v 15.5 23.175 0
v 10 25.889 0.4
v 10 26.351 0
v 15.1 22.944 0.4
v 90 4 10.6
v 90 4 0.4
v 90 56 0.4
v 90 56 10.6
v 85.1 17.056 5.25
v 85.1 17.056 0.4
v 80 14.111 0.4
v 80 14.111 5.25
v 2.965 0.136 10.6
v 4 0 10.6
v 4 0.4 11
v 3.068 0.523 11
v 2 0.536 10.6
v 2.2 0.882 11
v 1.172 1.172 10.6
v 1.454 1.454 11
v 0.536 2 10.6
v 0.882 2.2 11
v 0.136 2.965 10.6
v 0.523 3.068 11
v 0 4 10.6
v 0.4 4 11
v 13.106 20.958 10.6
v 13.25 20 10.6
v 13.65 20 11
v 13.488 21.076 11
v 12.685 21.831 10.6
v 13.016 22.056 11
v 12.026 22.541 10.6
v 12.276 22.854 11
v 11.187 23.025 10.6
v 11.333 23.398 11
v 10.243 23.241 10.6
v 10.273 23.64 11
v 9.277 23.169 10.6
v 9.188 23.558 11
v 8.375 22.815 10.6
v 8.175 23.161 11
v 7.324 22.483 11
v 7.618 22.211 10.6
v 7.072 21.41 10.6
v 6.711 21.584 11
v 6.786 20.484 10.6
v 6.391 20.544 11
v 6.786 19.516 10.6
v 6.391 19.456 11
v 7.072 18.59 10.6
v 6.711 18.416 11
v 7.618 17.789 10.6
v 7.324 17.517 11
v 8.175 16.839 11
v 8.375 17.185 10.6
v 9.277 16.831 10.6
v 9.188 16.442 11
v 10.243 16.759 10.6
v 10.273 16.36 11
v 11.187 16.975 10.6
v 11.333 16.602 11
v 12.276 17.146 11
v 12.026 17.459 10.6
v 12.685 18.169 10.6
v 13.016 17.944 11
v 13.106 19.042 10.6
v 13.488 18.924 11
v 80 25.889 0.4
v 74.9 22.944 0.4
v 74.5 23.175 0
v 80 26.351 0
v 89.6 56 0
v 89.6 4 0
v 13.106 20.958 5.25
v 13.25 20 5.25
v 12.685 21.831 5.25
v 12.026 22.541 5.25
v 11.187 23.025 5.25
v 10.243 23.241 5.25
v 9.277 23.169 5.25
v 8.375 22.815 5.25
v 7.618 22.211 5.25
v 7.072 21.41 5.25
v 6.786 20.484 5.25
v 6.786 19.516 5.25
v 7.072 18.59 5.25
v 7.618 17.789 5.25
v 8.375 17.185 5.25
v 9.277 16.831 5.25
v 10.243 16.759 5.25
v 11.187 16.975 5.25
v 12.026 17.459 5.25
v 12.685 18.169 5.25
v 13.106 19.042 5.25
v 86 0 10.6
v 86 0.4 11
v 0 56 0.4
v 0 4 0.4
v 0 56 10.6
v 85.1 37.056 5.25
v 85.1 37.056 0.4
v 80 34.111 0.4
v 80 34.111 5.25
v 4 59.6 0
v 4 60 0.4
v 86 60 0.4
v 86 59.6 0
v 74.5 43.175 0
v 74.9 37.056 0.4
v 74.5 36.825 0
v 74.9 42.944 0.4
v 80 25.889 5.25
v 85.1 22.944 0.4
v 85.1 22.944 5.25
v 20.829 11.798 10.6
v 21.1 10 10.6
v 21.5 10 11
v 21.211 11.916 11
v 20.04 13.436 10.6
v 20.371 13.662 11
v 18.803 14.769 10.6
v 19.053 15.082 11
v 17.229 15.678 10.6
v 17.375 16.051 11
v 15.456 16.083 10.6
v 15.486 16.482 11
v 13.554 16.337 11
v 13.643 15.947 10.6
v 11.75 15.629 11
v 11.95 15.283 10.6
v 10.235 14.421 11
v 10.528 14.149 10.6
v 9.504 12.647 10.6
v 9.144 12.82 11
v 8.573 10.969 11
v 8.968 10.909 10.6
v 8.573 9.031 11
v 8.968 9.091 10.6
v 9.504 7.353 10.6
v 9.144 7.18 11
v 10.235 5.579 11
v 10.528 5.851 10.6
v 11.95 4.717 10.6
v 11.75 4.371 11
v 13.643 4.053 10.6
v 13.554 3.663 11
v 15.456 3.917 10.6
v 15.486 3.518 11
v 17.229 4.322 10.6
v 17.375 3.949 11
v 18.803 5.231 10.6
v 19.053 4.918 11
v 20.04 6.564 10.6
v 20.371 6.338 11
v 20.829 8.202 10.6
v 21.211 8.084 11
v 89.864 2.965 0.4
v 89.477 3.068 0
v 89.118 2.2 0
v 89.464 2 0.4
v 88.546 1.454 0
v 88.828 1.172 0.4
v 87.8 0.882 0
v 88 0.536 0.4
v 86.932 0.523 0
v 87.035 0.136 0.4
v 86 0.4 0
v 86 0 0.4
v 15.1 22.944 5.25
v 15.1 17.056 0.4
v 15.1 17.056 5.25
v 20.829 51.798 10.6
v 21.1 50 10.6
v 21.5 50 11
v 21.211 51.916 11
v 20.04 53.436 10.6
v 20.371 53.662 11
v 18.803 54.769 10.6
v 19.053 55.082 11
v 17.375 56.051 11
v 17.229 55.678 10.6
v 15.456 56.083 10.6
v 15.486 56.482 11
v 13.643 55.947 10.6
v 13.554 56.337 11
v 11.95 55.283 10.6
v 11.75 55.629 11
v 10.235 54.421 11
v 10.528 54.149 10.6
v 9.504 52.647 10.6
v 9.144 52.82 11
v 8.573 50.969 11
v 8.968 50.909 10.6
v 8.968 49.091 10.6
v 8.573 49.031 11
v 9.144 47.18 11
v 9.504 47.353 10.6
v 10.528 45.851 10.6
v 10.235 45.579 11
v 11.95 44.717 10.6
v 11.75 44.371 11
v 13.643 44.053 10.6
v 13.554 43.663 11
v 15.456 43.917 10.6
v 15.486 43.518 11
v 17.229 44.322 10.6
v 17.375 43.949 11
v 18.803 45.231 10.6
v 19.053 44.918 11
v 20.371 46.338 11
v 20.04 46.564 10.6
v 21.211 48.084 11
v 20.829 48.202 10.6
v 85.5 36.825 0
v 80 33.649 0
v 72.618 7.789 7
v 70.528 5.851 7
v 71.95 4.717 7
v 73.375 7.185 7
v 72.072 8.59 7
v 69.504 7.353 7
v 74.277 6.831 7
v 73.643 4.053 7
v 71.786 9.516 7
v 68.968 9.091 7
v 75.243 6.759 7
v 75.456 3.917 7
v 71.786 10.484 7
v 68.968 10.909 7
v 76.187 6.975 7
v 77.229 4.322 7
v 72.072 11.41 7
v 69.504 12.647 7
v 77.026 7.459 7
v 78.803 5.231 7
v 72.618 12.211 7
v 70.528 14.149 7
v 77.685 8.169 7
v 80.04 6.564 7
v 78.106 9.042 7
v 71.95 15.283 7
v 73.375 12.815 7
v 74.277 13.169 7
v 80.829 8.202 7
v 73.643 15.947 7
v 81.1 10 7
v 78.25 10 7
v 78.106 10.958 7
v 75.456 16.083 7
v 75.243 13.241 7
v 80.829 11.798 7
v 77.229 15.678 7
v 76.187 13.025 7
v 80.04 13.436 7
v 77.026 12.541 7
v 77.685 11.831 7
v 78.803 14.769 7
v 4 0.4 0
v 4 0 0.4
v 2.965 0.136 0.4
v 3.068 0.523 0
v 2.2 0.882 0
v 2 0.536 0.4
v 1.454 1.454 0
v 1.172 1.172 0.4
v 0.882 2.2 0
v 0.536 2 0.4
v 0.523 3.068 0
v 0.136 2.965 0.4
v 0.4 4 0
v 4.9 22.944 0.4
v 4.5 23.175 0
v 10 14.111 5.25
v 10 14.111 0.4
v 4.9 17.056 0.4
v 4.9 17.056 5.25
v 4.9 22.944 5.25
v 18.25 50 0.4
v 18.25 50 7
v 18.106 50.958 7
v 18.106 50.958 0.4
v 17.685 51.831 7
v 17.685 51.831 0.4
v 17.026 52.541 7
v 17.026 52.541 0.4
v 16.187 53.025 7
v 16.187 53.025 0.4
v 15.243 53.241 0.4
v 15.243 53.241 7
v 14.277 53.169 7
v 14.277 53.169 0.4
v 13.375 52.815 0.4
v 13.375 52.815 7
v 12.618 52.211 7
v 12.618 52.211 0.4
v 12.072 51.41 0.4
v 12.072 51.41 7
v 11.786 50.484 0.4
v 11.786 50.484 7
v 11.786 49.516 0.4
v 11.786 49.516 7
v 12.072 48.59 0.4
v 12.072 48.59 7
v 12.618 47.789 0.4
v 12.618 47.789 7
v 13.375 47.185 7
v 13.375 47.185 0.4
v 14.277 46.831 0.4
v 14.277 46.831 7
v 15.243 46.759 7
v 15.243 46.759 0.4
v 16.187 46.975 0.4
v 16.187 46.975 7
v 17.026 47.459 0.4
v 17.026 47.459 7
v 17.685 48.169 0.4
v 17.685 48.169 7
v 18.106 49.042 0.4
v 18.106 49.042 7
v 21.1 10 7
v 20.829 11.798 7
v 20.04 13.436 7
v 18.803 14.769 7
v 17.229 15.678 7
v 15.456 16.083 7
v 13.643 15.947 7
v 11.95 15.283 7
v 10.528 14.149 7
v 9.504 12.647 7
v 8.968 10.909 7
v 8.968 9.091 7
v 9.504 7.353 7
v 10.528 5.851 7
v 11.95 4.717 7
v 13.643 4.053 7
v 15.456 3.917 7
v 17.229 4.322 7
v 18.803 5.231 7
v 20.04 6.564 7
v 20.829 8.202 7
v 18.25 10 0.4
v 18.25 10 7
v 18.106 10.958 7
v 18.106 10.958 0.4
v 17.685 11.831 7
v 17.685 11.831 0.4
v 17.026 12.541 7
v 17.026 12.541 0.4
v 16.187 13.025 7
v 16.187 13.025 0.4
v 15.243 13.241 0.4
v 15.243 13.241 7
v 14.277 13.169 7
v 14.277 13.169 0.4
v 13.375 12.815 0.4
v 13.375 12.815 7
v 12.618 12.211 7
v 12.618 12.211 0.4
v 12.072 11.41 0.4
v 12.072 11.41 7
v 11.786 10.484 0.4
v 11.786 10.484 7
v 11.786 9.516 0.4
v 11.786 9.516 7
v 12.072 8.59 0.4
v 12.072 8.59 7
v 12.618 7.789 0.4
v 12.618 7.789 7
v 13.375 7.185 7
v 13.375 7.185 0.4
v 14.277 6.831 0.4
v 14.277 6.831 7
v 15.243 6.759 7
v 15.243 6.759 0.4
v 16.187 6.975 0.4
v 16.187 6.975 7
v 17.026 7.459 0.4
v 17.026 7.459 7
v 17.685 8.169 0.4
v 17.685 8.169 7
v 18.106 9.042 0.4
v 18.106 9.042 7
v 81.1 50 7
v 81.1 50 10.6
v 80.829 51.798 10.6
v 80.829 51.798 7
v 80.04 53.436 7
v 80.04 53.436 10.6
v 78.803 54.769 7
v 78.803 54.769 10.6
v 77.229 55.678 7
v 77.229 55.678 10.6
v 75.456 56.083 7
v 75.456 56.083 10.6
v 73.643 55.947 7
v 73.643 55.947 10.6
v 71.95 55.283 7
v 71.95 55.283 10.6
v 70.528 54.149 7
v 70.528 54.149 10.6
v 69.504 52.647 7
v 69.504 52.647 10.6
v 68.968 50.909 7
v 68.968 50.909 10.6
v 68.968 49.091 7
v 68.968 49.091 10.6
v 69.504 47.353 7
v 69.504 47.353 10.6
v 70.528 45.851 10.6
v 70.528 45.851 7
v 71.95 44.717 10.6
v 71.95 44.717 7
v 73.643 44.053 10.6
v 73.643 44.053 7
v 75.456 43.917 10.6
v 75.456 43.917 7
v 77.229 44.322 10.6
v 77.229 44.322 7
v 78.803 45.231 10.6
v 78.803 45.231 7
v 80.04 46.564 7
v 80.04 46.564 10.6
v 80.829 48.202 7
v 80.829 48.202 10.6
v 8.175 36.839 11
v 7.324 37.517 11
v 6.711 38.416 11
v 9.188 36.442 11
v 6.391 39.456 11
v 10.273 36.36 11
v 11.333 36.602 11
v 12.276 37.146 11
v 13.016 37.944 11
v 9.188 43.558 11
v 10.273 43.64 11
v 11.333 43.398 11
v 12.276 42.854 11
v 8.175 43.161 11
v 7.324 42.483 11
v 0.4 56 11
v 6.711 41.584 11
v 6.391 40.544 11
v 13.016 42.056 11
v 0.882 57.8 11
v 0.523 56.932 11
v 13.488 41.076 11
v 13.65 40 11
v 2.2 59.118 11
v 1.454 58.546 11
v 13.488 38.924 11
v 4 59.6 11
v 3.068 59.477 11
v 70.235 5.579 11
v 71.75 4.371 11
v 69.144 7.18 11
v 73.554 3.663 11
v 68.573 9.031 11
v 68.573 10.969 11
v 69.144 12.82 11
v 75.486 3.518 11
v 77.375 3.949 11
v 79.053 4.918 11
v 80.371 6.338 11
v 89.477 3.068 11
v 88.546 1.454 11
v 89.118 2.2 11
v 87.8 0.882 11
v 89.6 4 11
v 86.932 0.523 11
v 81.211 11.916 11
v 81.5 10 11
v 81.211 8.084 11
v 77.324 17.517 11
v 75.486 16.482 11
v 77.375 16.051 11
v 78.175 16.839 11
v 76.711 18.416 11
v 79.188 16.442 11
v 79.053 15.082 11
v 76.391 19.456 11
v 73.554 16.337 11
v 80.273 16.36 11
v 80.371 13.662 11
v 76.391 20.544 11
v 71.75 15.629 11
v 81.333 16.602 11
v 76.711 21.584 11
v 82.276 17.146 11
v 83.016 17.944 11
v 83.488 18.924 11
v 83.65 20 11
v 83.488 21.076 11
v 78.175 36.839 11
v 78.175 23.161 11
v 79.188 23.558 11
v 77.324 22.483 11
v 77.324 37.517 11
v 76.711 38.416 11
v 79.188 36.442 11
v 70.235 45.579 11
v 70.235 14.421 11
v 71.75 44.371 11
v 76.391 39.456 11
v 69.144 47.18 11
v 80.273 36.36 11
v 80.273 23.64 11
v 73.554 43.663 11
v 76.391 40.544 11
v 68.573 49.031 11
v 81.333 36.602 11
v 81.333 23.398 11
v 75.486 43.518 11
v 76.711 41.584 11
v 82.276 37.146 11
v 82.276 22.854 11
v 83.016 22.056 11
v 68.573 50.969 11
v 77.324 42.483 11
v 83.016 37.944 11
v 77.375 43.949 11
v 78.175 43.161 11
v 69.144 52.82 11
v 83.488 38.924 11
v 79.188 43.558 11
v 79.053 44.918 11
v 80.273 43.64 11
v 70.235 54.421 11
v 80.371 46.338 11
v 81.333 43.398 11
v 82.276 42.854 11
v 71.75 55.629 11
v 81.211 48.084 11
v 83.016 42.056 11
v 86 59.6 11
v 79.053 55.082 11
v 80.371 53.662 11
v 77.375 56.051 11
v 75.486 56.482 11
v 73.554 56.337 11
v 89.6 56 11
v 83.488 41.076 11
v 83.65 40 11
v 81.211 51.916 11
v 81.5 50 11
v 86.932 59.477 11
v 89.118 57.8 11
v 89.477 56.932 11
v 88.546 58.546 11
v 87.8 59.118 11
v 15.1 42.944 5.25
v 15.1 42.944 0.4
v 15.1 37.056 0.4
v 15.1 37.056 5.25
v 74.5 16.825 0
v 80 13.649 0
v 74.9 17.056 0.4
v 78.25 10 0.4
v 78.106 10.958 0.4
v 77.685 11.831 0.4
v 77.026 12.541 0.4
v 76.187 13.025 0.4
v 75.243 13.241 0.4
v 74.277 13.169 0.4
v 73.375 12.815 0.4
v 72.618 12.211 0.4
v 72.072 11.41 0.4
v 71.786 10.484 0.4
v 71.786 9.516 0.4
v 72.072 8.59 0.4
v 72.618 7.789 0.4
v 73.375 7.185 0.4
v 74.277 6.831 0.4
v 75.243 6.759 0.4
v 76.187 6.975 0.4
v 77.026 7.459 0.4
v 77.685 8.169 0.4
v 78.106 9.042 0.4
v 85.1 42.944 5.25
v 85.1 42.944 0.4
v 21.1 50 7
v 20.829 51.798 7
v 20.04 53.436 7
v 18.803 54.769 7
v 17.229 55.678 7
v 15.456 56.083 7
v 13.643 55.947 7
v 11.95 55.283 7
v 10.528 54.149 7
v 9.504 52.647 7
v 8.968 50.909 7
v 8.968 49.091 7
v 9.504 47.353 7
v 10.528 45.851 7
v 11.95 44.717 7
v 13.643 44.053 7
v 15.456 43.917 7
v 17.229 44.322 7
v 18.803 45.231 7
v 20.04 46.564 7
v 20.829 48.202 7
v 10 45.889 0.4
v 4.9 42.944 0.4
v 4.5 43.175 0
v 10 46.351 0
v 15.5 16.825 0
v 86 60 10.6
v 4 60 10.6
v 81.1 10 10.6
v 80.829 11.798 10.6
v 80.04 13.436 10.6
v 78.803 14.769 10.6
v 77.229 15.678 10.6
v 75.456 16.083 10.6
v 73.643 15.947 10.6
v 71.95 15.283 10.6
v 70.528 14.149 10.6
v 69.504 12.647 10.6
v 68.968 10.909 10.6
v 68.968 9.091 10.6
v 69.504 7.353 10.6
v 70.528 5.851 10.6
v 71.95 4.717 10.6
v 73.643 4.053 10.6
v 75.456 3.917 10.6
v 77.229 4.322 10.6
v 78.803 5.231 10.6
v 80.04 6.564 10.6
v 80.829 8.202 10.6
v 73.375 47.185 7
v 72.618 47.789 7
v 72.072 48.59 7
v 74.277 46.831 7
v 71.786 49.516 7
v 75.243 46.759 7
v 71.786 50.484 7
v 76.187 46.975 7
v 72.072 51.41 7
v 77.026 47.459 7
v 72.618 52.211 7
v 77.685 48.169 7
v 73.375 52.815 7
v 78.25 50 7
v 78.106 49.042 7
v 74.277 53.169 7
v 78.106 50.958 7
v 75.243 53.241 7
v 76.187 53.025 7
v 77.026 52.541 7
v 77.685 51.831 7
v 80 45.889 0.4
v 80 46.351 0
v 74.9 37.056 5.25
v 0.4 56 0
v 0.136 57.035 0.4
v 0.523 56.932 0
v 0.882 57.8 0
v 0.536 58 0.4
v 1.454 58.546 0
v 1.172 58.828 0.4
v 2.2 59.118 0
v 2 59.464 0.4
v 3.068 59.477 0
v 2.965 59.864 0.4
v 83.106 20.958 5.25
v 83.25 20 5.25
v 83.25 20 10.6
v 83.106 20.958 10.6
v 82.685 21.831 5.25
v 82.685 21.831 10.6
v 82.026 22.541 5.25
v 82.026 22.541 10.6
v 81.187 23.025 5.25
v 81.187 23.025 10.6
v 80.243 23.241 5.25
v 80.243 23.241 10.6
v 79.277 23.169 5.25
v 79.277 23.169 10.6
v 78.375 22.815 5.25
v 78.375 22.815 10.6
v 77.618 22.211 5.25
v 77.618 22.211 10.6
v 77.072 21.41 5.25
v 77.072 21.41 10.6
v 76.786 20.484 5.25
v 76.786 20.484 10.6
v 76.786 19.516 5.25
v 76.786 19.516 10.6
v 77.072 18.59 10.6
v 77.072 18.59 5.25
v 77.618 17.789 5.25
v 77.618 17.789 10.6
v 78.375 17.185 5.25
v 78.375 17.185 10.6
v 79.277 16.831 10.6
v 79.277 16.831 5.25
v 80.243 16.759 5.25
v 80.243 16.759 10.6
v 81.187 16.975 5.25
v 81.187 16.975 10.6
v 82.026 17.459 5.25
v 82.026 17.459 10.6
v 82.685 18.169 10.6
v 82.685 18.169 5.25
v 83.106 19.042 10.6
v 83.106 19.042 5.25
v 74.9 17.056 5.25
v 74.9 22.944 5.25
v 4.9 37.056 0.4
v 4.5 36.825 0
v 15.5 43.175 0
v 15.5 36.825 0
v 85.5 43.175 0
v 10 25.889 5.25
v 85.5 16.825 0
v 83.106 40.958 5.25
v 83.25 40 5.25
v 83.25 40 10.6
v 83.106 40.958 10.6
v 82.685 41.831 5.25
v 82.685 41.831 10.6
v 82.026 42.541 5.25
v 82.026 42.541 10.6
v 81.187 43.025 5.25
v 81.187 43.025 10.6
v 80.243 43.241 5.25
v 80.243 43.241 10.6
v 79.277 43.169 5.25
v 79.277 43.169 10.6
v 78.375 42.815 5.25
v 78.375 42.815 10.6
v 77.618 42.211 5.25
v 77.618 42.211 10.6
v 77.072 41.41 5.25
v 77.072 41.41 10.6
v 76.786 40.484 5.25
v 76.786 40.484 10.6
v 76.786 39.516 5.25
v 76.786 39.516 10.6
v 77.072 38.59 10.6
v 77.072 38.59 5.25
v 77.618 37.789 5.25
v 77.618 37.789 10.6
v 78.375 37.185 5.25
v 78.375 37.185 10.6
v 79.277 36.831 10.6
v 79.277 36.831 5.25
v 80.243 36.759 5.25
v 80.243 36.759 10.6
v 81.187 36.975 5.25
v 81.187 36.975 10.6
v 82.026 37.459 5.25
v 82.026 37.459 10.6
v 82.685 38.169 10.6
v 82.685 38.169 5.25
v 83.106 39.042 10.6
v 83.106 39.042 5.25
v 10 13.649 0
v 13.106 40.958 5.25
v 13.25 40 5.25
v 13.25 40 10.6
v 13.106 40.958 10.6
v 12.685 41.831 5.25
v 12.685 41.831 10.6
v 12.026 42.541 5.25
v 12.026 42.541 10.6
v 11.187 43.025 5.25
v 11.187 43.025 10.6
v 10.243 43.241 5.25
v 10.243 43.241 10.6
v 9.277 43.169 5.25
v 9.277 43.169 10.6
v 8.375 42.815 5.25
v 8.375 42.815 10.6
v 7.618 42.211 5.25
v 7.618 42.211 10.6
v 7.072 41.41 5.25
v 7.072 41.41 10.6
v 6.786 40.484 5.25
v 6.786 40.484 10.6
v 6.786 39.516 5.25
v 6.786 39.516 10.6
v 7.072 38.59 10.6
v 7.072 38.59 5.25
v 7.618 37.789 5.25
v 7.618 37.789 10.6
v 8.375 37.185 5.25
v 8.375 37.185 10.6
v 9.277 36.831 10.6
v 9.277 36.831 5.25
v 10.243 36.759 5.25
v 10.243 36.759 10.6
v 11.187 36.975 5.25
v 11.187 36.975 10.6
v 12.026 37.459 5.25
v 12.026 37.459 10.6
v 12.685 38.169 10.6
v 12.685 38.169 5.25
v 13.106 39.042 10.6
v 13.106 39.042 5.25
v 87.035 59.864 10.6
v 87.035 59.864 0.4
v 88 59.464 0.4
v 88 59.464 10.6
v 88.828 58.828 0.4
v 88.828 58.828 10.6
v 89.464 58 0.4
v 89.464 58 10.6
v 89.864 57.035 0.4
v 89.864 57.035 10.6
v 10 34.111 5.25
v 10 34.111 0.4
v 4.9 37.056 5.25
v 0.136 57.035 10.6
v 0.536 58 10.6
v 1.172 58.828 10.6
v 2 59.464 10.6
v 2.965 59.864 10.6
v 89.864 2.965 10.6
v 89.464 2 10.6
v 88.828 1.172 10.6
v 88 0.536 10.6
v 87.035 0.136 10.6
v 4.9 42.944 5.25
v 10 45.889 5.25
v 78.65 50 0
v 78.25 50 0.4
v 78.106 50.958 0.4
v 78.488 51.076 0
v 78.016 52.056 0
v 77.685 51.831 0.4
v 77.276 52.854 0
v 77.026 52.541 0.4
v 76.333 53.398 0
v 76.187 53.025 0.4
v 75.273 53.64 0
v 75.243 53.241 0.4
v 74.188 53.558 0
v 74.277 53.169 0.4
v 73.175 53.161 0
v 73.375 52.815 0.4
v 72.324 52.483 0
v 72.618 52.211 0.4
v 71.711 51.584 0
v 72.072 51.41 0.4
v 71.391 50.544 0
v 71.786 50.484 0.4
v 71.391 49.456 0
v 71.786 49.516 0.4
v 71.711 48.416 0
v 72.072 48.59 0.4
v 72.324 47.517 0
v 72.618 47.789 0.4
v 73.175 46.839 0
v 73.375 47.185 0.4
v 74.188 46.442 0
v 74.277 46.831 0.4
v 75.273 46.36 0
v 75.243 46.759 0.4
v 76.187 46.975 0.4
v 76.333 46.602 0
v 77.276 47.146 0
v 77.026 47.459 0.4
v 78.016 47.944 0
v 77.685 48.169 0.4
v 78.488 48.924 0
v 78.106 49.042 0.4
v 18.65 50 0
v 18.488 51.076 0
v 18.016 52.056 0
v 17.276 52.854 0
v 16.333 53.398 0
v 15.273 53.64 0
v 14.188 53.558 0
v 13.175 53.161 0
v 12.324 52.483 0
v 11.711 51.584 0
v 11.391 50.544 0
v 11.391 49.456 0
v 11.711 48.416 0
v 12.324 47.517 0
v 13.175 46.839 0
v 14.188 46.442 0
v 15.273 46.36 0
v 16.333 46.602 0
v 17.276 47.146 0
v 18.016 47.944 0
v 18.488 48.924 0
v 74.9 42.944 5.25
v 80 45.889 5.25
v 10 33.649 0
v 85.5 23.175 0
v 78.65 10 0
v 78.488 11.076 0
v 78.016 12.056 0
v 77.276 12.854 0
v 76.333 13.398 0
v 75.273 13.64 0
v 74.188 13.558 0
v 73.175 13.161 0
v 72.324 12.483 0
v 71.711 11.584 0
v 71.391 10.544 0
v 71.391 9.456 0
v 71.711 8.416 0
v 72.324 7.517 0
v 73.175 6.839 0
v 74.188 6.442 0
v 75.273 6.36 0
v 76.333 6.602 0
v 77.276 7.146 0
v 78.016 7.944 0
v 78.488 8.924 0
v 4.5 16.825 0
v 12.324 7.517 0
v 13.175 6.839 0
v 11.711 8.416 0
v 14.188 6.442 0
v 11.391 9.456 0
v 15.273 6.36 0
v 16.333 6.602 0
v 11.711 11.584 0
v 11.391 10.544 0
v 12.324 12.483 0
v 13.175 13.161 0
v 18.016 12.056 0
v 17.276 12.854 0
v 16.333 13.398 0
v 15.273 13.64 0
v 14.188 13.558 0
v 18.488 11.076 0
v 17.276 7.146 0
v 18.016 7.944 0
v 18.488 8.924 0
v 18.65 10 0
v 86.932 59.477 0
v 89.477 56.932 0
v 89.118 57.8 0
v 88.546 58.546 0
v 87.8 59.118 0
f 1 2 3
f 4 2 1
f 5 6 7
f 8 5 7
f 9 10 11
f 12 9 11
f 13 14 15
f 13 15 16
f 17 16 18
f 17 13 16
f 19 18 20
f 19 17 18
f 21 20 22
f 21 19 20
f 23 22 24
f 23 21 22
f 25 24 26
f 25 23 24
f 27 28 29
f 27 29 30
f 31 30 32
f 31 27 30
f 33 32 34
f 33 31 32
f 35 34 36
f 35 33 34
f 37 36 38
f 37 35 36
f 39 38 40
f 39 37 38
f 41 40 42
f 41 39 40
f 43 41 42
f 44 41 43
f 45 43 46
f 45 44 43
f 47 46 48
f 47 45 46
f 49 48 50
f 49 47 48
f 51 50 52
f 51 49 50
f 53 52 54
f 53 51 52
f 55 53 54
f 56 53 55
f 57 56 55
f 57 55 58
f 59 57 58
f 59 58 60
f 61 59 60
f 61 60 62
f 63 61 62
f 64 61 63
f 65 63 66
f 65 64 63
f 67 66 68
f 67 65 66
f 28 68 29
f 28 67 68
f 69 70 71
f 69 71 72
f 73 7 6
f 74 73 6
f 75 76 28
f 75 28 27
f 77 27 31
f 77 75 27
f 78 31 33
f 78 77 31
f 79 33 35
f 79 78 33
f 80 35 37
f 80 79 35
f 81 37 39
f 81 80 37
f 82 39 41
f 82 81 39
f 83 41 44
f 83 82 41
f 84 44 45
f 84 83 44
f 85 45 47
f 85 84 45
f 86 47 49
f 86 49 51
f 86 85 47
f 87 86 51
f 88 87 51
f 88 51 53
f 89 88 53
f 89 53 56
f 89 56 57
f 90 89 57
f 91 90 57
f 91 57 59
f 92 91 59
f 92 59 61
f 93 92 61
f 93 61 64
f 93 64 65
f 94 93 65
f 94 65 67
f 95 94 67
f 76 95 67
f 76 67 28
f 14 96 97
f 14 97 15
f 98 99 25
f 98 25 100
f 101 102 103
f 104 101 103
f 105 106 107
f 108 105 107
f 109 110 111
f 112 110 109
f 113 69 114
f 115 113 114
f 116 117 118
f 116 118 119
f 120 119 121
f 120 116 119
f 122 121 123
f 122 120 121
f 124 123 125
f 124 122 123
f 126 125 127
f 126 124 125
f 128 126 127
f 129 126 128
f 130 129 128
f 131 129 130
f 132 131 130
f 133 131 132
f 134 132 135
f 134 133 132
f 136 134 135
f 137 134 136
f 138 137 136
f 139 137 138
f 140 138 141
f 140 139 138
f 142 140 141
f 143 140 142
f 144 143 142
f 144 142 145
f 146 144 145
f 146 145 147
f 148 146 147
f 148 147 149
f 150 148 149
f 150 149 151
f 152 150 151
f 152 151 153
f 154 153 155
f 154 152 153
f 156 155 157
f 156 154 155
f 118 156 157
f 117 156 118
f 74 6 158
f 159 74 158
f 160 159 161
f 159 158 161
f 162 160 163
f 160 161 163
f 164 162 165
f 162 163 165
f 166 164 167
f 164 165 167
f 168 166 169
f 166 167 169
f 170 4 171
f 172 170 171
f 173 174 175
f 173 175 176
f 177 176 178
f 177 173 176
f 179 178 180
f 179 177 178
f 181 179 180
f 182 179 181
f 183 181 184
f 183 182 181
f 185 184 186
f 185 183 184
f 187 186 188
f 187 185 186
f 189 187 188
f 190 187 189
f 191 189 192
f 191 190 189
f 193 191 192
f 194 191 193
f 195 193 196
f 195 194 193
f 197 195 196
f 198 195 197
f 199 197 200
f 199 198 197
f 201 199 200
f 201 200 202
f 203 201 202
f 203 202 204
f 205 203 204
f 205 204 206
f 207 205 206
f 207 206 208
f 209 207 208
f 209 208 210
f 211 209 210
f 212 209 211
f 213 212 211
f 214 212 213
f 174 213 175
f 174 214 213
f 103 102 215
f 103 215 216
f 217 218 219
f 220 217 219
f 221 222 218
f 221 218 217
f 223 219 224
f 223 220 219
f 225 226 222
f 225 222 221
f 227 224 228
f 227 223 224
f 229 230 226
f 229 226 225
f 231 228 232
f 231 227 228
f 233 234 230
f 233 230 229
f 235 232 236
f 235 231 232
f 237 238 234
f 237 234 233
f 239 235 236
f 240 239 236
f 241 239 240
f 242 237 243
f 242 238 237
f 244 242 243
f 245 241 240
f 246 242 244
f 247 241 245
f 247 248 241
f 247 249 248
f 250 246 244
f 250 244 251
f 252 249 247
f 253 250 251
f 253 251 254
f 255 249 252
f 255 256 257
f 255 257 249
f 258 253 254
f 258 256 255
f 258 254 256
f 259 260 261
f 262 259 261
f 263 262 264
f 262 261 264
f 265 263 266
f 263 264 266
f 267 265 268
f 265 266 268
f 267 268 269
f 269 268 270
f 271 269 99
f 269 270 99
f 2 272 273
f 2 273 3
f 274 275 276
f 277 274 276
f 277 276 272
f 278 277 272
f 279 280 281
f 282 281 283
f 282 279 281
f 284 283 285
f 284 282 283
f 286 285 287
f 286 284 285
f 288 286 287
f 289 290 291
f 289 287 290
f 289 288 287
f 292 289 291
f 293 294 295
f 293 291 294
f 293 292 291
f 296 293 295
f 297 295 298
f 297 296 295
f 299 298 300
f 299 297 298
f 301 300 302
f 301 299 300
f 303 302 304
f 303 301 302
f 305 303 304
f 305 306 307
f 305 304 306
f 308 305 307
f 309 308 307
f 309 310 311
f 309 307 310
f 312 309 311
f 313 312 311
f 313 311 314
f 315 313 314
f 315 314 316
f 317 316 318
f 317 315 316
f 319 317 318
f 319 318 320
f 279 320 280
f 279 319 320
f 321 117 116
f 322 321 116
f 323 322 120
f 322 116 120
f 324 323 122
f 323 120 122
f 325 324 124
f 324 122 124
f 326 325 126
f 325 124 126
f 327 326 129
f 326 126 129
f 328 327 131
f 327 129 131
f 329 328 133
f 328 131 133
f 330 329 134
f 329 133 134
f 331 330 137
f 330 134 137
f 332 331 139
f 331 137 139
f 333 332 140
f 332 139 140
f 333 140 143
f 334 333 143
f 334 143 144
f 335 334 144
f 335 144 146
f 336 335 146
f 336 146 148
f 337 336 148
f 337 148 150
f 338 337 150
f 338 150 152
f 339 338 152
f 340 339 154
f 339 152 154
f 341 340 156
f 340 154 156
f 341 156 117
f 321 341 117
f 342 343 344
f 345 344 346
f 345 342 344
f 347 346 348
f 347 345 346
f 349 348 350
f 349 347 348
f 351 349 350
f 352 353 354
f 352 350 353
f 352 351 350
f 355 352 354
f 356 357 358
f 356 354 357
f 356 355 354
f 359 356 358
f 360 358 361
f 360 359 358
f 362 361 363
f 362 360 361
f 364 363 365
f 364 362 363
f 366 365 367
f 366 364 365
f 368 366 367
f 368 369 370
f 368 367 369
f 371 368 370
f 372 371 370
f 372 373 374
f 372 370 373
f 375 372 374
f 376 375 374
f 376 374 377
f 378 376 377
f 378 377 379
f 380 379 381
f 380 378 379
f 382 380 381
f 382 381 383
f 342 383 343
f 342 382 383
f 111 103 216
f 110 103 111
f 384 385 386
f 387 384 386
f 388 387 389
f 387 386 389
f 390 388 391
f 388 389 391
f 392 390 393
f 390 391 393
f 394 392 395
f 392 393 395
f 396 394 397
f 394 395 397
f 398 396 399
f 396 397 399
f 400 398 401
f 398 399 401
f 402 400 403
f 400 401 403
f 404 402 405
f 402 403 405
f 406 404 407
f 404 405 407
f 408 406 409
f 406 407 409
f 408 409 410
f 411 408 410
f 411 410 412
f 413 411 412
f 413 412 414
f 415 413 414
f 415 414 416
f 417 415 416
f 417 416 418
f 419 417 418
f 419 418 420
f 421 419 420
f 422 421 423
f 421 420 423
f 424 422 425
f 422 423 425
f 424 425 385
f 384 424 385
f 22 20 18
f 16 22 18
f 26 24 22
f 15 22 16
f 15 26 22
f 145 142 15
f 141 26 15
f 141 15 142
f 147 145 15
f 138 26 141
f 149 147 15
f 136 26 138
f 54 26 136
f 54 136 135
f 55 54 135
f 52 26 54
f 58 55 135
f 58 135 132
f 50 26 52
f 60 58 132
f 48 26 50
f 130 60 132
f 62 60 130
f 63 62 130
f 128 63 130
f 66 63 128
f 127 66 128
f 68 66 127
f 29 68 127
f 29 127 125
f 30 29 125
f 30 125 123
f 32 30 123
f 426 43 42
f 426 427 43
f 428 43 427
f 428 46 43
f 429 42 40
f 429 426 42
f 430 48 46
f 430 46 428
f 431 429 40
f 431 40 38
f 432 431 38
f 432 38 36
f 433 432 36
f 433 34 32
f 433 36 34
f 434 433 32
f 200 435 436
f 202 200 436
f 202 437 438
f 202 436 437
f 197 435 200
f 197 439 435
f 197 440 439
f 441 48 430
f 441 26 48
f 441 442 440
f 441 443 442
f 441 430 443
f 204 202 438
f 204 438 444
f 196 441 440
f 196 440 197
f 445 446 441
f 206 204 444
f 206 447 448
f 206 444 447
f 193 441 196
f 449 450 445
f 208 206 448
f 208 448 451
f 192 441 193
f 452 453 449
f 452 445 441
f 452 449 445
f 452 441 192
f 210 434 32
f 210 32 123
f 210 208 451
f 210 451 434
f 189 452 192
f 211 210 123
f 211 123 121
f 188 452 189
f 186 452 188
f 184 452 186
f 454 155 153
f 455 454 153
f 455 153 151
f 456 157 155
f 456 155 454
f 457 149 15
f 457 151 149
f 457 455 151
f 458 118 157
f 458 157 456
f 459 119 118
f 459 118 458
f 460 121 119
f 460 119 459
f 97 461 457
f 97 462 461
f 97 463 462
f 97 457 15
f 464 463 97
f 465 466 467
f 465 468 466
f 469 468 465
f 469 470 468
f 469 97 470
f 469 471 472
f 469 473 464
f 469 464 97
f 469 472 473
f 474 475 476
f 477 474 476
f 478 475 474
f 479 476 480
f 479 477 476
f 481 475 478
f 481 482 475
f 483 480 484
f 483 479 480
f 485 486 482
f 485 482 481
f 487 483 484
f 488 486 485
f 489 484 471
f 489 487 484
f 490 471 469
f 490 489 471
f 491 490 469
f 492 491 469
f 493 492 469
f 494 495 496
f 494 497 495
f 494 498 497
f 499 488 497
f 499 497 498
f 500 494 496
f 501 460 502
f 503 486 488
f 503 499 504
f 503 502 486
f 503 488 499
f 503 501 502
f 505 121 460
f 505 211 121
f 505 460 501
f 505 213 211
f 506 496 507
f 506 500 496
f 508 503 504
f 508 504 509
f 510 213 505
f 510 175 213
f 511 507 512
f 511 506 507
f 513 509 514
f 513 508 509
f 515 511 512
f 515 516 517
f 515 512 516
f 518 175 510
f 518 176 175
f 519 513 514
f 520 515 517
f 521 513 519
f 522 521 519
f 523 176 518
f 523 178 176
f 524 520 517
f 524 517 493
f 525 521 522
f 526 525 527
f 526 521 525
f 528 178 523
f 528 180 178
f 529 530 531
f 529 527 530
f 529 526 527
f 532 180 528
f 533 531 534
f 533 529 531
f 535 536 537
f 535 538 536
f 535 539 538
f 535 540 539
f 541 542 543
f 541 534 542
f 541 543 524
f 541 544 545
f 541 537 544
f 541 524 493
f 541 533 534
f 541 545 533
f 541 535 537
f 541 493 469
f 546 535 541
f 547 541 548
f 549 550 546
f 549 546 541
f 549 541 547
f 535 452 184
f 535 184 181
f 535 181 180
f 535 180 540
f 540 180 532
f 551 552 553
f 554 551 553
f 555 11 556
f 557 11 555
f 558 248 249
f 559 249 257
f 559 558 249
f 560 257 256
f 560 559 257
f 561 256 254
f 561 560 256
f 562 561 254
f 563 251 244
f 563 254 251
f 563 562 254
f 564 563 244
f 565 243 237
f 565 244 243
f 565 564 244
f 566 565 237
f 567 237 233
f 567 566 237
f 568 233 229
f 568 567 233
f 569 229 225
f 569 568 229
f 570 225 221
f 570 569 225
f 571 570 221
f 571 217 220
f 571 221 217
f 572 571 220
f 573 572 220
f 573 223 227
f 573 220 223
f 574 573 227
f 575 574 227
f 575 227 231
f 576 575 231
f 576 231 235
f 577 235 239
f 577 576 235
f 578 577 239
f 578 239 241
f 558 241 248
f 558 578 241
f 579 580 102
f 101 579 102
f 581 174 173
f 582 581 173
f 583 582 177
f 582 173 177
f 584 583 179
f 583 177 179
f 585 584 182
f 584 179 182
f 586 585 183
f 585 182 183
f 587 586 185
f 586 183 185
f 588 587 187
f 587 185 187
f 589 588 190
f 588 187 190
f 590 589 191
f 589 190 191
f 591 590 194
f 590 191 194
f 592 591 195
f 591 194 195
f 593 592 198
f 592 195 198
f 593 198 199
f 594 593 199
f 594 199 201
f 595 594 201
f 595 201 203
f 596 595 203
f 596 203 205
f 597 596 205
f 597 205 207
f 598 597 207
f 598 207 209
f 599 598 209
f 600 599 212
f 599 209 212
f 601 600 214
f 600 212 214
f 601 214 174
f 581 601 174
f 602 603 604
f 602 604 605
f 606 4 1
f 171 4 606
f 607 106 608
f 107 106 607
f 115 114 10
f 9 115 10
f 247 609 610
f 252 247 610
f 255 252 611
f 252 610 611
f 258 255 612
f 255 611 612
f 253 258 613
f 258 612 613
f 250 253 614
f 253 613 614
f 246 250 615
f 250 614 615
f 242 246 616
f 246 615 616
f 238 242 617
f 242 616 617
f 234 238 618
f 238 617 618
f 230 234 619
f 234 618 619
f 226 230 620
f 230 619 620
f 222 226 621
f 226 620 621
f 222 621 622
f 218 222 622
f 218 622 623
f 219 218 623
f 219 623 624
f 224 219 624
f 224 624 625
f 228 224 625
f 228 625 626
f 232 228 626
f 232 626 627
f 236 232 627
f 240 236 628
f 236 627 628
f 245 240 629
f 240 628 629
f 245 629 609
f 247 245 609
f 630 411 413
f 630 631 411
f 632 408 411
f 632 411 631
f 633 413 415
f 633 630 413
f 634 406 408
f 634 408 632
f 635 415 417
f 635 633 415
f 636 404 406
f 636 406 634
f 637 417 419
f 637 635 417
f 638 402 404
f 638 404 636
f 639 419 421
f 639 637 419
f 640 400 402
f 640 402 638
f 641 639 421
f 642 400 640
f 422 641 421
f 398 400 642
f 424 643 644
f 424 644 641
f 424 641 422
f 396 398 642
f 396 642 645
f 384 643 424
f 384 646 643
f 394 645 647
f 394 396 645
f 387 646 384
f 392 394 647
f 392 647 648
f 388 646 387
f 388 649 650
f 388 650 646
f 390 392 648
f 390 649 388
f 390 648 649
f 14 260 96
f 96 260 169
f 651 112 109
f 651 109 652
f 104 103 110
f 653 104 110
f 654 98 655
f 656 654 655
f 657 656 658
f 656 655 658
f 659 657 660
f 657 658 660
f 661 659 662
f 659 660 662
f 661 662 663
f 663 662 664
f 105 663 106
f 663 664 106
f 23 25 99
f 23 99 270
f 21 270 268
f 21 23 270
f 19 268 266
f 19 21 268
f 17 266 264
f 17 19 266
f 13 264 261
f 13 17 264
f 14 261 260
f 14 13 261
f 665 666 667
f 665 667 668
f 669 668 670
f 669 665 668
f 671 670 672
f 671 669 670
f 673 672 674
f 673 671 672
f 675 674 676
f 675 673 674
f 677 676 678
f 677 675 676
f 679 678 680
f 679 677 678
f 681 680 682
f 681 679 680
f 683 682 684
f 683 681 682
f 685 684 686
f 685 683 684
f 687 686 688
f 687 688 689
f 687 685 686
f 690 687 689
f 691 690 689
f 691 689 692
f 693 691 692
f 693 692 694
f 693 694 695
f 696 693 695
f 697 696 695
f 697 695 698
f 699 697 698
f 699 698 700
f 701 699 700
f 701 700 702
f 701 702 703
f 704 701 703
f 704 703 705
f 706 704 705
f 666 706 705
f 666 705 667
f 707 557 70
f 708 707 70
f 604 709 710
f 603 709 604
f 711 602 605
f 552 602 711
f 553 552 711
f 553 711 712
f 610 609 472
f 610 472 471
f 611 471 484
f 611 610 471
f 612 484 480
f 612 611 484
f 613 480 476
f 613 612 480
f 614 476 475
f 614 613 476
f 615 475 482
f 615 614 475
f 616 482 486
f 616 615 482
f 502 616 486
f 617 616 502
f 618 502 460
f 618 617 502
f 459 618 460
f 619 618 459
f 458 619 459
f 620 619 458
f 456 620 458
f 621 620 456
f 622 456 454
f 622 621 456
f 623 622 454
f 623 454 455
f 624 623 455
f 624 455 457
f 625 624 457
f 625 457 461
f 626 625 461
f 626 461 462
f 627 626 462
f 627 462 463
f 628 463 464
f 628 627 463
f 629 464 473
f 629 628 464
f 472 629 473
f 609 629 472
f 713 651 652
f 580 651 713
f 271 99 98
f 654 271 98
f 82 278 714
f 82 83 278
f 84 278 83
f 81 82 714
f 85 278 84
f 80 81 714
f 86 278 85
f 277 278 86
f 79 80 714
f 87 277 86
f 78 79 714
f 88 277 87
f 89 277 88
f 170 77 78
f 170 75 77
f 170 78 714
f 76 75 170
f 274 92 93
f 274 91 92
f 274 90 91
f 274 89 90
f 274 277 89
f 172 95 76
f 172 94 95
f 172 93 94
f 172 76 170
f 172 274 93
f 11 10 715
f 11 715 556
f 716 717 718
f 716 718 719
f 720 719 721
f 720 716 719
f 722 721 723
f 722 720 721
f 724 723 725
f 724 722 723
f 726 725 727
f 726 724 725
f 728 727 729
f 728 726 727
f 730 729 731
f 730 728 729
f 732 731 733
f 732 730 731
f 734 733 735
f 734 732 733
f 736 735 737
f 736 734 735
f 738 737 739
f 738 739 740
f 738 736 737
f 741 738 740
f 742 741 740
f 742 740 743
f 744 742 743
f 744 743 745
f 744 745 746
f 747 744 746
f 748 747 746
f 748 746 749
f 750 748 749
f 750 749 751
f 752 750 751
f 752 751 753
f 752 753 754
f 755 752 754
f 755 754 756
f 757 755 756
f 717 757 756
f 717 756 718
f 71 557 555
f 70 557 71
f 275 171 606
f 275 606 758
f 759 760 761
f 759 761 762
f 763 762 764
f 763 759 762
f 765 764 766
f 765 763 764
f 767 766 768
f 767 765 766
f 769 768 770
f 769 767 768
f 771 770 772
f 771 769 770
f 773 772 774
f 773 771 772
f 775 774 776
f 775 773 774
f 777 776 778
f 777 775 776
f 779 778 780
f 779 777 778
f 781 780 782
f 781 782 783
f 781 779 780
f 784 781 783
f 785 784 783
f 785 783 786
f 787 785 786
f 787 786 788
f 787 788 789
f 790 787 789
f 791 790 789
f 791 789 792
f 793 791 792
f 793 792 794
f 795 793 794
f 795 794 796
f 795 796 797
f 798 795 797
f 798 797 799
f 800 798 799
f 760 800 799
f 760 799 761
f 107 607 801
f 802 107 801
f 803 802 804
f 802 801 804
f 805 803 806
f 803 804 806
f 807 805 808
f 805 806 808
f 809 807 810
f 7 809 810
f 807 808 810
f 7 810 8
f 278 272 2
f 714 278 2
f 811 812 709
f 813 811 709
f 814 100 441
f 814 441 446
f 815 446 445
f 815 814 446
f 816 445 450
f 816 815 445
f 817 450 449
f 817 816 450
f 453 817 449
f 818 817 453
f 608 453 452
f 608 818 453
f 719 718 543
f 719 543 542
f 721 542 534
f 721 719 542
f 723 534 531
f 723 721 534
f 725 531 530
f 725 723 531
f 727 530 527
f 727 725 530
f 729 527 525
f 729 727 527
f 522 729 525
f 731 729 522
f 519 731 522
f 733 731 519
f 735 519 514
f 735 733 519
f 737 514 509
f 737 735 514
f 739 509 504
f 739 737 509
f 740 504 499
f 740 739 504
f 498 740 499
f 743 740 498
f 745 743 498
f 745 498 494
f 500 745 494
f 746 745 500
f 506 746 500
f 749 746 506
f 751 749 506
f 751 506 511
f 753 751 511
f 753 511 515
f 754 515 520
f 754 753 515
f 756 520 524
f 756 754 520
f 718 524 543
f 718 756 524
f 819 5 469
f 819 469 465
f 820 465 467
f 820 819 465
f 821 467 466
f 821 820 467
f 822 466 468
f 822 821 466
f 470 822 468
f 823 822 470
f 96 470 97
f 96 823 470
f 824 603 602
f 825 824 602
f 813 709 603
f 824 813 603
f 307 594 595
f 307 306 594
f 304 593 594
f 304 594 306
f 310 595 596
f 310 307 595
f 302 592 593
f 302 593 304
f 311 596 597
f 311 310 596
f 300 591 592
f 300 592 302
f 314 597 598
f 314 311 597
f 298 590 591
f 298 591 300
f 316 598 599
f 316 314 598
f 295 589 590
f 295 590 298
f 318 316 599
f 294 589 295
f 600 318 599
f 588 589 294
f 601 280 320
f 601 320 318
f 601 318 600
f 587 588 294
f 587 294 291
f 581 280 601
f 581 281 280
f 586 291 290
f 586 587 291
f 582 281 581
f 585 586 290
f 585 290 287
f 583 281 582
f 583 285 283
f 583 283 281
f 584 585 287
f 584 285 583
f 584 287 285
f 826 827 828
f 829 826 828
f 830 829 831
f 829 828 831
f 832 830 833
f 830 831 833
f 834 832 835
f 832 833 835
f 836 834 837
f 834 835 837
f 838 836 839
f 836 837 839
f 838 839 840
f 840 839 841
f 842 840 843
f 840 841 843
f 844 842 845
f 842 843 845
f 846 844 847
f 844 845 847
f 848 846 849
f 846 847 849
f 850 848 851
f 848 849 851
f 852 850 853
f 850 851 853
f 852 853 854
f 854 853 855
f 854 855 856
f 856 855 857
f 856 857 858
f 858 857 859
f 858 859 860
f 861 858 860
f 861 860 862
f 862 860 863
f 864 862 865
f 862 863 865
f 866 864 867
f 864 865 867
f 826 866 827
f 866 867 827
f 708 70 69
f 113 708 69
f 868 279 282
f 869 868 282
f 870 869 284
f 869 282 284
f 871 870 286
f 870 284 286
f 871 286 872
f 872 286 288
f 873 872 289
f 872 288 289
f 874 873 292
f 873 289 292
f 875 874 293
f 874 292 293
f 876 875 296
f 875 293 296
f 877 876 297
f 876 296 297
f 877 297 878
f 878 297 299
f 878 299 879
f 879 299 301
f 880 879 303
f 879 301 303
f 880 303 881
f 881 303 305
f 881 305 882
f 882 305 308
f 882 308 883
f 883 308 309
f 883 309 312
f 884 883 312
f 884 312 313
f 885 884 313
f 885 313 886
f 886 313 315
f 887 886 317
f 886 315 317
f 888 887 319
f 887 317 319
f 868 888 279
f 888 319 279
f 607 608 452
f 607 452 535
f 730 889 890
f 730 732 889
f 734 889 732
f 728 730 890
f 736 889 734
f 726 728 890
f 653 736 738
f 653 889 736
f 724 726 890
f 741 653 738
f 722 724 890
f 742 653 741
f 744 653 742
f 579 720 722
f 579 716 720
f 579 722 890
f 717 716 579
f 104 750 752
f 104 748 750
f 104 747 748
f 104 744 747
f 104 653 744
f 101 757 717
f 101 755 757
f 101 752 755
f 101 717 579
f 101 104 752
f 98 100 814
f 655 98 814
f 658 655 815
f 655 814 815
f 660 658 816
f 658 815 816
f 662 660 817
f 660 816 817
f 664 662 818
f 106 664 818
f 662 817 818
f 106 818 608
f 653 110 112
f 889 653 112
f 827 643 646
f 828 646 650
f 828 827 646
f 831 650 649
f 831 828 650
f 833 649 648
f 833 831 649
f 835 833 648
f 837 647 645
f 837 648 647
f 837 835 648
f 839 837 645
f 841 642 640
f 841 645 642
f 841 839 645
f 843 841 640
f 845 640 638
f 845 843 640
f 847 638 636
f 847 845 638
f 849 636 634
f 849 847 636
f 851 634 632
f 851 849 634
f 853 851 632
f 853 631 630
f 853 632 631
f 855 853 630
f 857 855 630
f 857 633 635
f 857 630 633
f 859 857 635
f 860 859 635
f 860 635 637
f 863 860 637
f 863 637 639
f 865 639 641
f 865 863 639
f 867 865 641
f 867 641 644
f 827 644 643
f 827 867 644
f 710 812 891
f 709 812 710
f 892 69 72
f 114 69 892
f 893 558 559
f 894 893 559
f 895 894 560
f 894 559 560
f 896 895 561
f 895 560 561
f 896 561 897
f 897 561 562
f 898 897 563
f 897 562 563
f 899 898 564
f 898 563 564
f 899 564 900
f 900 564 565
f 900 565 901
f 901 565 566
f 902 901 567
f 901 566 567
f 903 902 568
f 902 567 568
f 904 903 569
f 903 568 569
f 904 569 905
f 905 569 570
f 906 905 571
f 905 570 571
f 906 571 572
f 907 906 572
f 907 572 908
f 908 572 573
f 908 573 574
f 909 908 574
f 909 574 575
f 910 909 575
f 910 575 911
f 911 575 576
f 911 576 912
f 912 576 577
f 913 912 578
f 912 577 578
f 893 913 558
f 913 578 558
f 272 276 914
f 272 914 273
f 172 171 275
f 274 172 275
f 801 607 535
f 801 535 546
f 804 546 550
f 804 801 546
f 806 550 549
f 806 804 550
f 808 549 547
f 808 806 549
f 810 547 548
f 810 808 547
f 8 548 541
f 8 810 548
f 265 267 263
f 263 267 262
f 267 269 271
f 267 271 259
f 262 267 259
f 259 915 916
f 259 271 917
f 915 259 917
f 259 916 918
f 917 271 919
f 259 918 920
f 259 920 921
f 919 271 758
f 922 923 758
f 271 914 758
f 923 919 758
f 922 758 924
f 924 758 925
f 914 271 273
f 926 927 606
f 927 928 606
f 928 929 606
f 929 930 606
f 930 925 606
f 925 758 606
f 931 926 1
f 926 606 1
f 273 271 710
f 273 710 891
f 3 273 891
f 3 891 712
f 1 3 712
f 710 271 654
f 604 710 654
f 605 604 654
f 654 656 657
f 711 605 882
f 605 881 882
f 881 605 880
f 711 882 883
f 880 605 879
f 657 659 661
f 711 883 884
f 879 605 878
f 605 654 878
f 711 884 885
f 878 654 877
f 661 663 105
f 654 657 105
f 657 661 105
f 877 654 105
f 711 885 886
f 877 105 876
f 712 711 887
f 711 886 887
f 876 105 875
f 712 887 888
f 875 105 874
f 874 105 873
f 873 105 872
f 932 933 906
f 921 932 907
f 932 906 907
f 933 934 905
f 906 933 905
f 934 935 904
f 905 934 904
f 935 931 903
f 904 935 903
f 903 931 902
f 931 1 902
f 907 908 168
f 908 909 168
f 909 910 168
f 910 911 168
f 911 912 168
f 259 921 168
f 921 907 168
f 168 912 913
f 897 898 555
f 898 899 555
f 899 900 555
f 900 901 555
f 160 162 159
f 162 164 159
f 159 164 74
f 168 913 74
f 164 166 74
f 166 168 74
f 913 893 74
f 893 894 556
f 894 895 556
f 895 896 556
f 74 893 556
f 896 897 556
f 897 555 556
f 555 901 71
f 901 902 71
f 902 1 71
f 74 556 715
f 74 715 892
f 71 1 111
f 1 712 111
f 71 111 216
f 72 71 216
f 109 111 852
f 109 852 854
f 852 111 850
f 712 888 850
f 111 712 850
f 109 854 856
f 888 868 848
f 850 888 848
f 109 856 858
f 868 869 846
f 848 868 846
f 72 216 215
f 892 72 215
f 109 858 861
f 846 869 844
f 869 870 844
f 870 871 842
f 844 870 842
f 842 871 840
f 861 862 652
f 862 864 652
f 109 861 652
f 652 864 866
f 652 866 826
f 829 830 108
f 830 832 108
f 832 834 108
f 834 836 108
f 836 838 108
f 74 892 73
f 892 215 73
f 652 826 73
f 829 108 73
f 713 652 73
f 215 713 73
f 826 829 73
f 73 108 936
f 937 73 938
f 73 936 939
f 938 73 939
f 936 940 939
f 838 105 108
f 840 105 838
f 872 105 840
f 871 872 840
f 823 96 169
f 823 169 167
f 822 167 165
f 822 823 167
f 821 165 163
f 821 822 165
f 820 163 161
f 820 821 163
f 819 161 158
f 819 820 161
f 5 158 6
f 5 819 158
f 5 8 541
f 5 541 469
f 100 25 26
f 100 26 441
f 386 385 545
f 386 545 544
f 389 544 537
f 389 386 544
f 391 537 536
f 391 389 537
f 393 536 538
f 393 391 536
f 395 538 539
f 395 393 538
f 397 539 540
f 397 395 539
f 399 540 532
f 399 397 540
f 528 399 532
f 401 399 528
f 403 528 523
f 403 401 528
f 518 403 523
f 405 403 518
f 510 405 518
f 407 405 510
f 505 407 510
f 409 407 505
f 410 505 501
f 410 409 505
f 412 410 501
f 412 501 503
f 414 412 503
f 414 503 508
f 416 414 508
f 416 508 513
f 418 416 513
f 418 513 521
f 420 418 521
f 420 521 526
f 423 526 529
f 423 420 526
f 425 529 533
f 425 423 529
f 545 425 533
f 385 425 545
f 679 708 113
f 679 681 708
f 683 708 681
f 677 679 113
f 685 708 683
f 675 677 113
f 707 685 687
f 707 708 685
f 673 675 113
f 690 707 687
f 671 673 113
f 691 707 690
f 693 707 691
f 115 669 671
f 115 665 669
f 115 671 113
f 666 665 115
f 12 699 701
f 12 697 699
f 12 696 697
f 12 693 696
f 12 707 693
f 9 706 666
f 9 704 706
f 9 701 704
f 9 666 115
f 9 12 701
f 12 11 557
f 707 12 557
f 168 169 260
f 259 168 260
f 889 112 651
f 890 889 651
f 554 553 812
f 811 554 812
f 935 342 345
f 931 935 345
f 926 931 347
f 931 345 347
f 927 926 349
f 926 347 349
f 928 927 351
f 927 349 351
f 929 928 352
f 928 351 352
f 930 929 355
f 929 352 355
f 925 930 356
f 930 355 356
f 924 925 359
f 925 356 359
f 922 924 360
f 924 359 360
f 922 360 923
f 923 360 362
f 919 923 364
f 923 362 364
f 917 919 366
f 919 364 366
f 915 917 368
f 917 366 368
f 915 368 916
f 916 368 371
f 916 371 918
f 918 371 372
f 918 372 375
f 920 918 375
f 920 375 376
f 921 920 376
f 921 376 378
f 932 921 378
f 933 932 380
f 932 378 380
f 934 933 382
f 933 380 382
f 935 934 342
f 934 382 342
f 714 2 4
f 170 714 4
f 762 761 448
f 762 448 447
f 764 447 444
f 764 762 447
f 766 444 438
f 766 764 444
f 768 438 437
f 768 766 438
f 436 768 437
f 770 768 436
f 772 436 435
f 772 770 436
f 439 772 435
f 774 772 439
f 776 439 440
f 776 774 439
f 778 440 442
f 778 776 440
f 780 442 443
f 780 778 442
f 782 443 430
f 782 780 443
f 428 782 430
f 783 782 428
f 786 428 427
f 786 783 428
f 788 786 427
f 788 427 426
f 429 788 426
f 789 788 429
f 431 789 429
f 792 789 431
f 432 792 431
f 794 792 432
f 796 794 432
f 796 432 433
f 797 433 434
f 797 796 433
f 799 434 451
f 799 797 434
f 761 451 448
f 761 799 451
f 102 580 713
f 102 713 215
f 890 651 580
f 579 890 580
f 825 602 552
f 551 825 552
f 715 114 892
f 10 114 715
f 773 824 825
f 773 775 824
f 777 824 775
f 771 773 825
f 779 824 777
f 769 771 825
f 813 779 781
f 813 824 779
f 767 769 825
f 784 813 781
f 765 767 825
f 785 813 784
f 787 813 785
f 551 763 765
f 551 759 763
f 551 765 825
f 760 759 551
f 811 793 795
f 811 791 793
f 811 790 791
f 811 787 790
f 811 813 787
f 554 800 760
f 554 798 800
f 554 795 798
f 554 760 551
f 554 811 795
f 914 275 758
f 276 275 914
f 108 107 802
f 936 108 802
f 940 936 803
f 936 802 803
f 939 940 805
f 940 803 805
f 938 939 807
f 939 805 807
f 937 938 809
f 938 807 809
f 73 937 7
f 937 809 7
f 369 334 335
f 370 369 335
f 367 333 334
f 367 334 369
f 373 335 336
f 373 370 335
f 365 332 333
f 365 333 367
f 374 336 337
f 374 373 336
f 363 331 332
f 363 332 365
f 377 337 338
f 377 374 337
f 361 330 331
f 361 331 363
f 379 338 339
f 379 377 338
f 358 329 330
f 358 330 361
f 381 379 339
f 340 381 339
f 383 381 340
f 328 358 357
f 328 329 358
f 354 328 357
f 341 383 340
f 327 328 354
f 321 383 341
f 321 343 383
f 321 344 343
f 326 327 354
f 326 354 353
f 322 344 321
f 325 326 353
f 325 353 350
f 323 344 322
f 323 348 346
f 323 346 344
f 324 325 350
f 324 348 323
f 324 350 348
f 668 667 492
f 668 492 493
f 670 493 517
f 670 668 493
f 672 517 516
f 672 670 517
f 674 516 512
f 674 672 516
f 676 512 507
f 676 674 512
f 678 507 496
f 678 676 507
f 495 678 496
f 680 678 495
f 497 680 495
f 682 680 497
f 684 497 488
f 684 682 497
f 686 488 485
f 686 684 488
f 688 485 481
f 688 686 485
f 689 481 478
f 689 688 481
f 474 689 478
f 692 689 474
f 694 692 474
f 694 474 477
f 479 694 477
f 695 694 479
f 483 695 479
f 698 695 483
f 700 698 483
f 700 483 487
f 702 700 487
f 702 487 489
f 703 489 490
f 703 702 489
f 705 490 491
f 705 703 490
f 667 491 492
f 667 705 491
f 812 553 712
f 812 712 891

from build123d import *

# Parameters (mm, degrees)
SKETCH_W        = 90
SKETCH_H        = 60
SKETCH_R        = 3.25
PAD_DEPTH       = 11
SKETCH001_R     = 6.1
POCKET_DEPTH    = 4
POCKET001_DEPTH = 5.25
FILLET_R        = 4
CHAMFER_SIZE    = 0.4
CHAMFER001_SIZE = 0.4


with BuildPart() as part:
    # Sketch → Pad (new body)
    with BuildSketch(Plane.XY):
        with Locations((45, 30)):
            Rectangle(SKETCH_W, SKETCH_H)
        with Locations((10, 40)):
            Circle(SKETCH_R, mode=Mode.SUBTRACT)
        with Locations((80, 40)):
            Circle(SKETCH_R, mode=Mode.SUBTRACT)
        with Locations((10, 20)):
            Circle(SKETCH_R, mode=Mode.SUBTRACT)
        with Locations((80, 20)):
            Circle(SKETCH_R, mode=Mode.SUBTRACT)
        with Locations((15, 50)):
            Circle(SKETCH_R, mode=Mode.SUBTRACT)
        with Locations((75, 50)):
            Circle(SKETCH_R, mode=Mode.SUBTRACT)
        with Locations((75, 10)):
            Circle(SKETCH_R, mode=Mode.SUBTRACT)
        with Locations((15, 10)):
            Circle(SKETCH_R, mode=Mode.SUBTRACT)
    extrude(amount=PAD_DEPTH)

    # Sketch001 (on Face14 of Pad) → Pocket (cut)
    with BuildSketch(Plane.XY.offset(11)):
        with Locations((15, 50)):
            Circle(SKETCH001_R)
        with Locations((75, 50)):
            Circle(SKETCH001_R)
        with Locations((75, 10)):
            Circle(SKETCH001_R)
        with Locations((15, 10)):
            Circle(SKETCH001_R)
    extrude(amount=-POCKET_DEPTH, mode=Mode.SUBTRACT)

    # Sketch002 (on Face4 of Pocket) → Pocket001 (cut)
    with BuildSketch(Plane(origin=(0, 0, 0), x_dir=(1, 0, 0), z_dir=(0, 0, -1))):
        Polygon((15.1, -17.055514), (10, -14.111027), (4.9, -17.055514), (4.9, -22.944486), (10, -25.888973), (15.1, -22.944486), align=None)
        Polygon((80, -14.111027), (74.9, -17.055514), (74.9, -22.944486), (80, -25.888973), (85.1, -22.944486), (85.1, -17.055514), align=None)
        Polygon((10, -34.111027), (4.9, -37.055514), (4.9, -42.944486), (10, -45.888973), (15.1, -42.944486), (15.1, -37.055514), align=None)
        Polygon((80, -34.111027), (74.9, -37.055514), (74.9, -42.944486), (80, -45.888973), (85.1, -42.944486), (85.1, -37.055514), align=None)
    extrude(amount=-POCKET001_DEPTH, mode=Mode.SUBTRACT)

    # Fillet
    fillet_edges = [part.edges().sort_by_distance(p)[0] for p in [
        (0, 60, 5.5),
        (90, 60, 5.5),
        (90, 0, 5.5),
        (0, 0, 5.5),
    ]]
    fillet(fillet_edges, radius=FILLET_R)

    # Chamfer
    chamfer_edges = [part.edges().sort_by_distance(p)[0] for p in [
        (45, 60, 11),
        (1.171573, 58.828427, 11),
        (88.828427, 58.828427, 11),
        (0, 30, 11),
        (90, 30, 11),
        (1.171573, 1.171573, 11),
        (88.828427, 1.171573, 11),
        (45, 0, 11),
        (68.9, 10, 11),
        (76.75, 20, 11),
        (8.9, 10, 11),
        (6.75, 20, 11),
        (76.75, 40, 11),
        (68.9, 50, 11),
        (6.75, 40, 11),
        (8.9, 50, 11),
    ]]
    chamfer(chamfer_edges, length=CHAMFER_SIZE)

    # Chamfer001
    chamfer001_edges = [part.edges().sort_by_distance(p)[0] for p in [
        (45, 60, 0),
        (1.171573, 58.828427, 0),
        (88.828427, 58.828427, 0),
        (0, 30, 0),
        (90, 30, 0),
        (1.171573, 1.171573, 0),
        (88.828427, 1.171573, 0),
        (45, 0, 0),
        (71.75, 10, 0),
        (77.45, 15.58327, 0),
        (74.9, 20, 0),
        (77.45, 24.41673, 0),
        (82.55, 24.41673, 0),
        (85.1, 20, 0),
        (82.55, 15.58327, 0),
        (11.75, 10, 0),
        (12.55, 15.58327, 0),
        (7.45, 15.58327, 0),
        (4.9, 20, 0),
        (7.45, 24.41673, 0),
        (12.55, 24.41673, 0),
        (15.1, 20, 0),
        (77.45, 35.58327, 0),
        (74.9, 40, 0),
        (77.45, 44.41673, 0),
        (82.55, 44.41673, 0),
        (85.1, 40, 0),
        (82.55, 35.58327, 0),
        (71.75, 50, 0),
        (7.45, 35.58327, 0),
        (4.9, 40, 0),
        (7.45, 44.41673, 0),
        (12.55, 44.41673, 0),
        (15.1, 40, 0),
        (12.55, 35.58327, 0),
        (11.75, 50, 0),
    ]]
    chamfer(chamfer001_edges, length=CHAMFER001_SIZE)


solid = part.part
